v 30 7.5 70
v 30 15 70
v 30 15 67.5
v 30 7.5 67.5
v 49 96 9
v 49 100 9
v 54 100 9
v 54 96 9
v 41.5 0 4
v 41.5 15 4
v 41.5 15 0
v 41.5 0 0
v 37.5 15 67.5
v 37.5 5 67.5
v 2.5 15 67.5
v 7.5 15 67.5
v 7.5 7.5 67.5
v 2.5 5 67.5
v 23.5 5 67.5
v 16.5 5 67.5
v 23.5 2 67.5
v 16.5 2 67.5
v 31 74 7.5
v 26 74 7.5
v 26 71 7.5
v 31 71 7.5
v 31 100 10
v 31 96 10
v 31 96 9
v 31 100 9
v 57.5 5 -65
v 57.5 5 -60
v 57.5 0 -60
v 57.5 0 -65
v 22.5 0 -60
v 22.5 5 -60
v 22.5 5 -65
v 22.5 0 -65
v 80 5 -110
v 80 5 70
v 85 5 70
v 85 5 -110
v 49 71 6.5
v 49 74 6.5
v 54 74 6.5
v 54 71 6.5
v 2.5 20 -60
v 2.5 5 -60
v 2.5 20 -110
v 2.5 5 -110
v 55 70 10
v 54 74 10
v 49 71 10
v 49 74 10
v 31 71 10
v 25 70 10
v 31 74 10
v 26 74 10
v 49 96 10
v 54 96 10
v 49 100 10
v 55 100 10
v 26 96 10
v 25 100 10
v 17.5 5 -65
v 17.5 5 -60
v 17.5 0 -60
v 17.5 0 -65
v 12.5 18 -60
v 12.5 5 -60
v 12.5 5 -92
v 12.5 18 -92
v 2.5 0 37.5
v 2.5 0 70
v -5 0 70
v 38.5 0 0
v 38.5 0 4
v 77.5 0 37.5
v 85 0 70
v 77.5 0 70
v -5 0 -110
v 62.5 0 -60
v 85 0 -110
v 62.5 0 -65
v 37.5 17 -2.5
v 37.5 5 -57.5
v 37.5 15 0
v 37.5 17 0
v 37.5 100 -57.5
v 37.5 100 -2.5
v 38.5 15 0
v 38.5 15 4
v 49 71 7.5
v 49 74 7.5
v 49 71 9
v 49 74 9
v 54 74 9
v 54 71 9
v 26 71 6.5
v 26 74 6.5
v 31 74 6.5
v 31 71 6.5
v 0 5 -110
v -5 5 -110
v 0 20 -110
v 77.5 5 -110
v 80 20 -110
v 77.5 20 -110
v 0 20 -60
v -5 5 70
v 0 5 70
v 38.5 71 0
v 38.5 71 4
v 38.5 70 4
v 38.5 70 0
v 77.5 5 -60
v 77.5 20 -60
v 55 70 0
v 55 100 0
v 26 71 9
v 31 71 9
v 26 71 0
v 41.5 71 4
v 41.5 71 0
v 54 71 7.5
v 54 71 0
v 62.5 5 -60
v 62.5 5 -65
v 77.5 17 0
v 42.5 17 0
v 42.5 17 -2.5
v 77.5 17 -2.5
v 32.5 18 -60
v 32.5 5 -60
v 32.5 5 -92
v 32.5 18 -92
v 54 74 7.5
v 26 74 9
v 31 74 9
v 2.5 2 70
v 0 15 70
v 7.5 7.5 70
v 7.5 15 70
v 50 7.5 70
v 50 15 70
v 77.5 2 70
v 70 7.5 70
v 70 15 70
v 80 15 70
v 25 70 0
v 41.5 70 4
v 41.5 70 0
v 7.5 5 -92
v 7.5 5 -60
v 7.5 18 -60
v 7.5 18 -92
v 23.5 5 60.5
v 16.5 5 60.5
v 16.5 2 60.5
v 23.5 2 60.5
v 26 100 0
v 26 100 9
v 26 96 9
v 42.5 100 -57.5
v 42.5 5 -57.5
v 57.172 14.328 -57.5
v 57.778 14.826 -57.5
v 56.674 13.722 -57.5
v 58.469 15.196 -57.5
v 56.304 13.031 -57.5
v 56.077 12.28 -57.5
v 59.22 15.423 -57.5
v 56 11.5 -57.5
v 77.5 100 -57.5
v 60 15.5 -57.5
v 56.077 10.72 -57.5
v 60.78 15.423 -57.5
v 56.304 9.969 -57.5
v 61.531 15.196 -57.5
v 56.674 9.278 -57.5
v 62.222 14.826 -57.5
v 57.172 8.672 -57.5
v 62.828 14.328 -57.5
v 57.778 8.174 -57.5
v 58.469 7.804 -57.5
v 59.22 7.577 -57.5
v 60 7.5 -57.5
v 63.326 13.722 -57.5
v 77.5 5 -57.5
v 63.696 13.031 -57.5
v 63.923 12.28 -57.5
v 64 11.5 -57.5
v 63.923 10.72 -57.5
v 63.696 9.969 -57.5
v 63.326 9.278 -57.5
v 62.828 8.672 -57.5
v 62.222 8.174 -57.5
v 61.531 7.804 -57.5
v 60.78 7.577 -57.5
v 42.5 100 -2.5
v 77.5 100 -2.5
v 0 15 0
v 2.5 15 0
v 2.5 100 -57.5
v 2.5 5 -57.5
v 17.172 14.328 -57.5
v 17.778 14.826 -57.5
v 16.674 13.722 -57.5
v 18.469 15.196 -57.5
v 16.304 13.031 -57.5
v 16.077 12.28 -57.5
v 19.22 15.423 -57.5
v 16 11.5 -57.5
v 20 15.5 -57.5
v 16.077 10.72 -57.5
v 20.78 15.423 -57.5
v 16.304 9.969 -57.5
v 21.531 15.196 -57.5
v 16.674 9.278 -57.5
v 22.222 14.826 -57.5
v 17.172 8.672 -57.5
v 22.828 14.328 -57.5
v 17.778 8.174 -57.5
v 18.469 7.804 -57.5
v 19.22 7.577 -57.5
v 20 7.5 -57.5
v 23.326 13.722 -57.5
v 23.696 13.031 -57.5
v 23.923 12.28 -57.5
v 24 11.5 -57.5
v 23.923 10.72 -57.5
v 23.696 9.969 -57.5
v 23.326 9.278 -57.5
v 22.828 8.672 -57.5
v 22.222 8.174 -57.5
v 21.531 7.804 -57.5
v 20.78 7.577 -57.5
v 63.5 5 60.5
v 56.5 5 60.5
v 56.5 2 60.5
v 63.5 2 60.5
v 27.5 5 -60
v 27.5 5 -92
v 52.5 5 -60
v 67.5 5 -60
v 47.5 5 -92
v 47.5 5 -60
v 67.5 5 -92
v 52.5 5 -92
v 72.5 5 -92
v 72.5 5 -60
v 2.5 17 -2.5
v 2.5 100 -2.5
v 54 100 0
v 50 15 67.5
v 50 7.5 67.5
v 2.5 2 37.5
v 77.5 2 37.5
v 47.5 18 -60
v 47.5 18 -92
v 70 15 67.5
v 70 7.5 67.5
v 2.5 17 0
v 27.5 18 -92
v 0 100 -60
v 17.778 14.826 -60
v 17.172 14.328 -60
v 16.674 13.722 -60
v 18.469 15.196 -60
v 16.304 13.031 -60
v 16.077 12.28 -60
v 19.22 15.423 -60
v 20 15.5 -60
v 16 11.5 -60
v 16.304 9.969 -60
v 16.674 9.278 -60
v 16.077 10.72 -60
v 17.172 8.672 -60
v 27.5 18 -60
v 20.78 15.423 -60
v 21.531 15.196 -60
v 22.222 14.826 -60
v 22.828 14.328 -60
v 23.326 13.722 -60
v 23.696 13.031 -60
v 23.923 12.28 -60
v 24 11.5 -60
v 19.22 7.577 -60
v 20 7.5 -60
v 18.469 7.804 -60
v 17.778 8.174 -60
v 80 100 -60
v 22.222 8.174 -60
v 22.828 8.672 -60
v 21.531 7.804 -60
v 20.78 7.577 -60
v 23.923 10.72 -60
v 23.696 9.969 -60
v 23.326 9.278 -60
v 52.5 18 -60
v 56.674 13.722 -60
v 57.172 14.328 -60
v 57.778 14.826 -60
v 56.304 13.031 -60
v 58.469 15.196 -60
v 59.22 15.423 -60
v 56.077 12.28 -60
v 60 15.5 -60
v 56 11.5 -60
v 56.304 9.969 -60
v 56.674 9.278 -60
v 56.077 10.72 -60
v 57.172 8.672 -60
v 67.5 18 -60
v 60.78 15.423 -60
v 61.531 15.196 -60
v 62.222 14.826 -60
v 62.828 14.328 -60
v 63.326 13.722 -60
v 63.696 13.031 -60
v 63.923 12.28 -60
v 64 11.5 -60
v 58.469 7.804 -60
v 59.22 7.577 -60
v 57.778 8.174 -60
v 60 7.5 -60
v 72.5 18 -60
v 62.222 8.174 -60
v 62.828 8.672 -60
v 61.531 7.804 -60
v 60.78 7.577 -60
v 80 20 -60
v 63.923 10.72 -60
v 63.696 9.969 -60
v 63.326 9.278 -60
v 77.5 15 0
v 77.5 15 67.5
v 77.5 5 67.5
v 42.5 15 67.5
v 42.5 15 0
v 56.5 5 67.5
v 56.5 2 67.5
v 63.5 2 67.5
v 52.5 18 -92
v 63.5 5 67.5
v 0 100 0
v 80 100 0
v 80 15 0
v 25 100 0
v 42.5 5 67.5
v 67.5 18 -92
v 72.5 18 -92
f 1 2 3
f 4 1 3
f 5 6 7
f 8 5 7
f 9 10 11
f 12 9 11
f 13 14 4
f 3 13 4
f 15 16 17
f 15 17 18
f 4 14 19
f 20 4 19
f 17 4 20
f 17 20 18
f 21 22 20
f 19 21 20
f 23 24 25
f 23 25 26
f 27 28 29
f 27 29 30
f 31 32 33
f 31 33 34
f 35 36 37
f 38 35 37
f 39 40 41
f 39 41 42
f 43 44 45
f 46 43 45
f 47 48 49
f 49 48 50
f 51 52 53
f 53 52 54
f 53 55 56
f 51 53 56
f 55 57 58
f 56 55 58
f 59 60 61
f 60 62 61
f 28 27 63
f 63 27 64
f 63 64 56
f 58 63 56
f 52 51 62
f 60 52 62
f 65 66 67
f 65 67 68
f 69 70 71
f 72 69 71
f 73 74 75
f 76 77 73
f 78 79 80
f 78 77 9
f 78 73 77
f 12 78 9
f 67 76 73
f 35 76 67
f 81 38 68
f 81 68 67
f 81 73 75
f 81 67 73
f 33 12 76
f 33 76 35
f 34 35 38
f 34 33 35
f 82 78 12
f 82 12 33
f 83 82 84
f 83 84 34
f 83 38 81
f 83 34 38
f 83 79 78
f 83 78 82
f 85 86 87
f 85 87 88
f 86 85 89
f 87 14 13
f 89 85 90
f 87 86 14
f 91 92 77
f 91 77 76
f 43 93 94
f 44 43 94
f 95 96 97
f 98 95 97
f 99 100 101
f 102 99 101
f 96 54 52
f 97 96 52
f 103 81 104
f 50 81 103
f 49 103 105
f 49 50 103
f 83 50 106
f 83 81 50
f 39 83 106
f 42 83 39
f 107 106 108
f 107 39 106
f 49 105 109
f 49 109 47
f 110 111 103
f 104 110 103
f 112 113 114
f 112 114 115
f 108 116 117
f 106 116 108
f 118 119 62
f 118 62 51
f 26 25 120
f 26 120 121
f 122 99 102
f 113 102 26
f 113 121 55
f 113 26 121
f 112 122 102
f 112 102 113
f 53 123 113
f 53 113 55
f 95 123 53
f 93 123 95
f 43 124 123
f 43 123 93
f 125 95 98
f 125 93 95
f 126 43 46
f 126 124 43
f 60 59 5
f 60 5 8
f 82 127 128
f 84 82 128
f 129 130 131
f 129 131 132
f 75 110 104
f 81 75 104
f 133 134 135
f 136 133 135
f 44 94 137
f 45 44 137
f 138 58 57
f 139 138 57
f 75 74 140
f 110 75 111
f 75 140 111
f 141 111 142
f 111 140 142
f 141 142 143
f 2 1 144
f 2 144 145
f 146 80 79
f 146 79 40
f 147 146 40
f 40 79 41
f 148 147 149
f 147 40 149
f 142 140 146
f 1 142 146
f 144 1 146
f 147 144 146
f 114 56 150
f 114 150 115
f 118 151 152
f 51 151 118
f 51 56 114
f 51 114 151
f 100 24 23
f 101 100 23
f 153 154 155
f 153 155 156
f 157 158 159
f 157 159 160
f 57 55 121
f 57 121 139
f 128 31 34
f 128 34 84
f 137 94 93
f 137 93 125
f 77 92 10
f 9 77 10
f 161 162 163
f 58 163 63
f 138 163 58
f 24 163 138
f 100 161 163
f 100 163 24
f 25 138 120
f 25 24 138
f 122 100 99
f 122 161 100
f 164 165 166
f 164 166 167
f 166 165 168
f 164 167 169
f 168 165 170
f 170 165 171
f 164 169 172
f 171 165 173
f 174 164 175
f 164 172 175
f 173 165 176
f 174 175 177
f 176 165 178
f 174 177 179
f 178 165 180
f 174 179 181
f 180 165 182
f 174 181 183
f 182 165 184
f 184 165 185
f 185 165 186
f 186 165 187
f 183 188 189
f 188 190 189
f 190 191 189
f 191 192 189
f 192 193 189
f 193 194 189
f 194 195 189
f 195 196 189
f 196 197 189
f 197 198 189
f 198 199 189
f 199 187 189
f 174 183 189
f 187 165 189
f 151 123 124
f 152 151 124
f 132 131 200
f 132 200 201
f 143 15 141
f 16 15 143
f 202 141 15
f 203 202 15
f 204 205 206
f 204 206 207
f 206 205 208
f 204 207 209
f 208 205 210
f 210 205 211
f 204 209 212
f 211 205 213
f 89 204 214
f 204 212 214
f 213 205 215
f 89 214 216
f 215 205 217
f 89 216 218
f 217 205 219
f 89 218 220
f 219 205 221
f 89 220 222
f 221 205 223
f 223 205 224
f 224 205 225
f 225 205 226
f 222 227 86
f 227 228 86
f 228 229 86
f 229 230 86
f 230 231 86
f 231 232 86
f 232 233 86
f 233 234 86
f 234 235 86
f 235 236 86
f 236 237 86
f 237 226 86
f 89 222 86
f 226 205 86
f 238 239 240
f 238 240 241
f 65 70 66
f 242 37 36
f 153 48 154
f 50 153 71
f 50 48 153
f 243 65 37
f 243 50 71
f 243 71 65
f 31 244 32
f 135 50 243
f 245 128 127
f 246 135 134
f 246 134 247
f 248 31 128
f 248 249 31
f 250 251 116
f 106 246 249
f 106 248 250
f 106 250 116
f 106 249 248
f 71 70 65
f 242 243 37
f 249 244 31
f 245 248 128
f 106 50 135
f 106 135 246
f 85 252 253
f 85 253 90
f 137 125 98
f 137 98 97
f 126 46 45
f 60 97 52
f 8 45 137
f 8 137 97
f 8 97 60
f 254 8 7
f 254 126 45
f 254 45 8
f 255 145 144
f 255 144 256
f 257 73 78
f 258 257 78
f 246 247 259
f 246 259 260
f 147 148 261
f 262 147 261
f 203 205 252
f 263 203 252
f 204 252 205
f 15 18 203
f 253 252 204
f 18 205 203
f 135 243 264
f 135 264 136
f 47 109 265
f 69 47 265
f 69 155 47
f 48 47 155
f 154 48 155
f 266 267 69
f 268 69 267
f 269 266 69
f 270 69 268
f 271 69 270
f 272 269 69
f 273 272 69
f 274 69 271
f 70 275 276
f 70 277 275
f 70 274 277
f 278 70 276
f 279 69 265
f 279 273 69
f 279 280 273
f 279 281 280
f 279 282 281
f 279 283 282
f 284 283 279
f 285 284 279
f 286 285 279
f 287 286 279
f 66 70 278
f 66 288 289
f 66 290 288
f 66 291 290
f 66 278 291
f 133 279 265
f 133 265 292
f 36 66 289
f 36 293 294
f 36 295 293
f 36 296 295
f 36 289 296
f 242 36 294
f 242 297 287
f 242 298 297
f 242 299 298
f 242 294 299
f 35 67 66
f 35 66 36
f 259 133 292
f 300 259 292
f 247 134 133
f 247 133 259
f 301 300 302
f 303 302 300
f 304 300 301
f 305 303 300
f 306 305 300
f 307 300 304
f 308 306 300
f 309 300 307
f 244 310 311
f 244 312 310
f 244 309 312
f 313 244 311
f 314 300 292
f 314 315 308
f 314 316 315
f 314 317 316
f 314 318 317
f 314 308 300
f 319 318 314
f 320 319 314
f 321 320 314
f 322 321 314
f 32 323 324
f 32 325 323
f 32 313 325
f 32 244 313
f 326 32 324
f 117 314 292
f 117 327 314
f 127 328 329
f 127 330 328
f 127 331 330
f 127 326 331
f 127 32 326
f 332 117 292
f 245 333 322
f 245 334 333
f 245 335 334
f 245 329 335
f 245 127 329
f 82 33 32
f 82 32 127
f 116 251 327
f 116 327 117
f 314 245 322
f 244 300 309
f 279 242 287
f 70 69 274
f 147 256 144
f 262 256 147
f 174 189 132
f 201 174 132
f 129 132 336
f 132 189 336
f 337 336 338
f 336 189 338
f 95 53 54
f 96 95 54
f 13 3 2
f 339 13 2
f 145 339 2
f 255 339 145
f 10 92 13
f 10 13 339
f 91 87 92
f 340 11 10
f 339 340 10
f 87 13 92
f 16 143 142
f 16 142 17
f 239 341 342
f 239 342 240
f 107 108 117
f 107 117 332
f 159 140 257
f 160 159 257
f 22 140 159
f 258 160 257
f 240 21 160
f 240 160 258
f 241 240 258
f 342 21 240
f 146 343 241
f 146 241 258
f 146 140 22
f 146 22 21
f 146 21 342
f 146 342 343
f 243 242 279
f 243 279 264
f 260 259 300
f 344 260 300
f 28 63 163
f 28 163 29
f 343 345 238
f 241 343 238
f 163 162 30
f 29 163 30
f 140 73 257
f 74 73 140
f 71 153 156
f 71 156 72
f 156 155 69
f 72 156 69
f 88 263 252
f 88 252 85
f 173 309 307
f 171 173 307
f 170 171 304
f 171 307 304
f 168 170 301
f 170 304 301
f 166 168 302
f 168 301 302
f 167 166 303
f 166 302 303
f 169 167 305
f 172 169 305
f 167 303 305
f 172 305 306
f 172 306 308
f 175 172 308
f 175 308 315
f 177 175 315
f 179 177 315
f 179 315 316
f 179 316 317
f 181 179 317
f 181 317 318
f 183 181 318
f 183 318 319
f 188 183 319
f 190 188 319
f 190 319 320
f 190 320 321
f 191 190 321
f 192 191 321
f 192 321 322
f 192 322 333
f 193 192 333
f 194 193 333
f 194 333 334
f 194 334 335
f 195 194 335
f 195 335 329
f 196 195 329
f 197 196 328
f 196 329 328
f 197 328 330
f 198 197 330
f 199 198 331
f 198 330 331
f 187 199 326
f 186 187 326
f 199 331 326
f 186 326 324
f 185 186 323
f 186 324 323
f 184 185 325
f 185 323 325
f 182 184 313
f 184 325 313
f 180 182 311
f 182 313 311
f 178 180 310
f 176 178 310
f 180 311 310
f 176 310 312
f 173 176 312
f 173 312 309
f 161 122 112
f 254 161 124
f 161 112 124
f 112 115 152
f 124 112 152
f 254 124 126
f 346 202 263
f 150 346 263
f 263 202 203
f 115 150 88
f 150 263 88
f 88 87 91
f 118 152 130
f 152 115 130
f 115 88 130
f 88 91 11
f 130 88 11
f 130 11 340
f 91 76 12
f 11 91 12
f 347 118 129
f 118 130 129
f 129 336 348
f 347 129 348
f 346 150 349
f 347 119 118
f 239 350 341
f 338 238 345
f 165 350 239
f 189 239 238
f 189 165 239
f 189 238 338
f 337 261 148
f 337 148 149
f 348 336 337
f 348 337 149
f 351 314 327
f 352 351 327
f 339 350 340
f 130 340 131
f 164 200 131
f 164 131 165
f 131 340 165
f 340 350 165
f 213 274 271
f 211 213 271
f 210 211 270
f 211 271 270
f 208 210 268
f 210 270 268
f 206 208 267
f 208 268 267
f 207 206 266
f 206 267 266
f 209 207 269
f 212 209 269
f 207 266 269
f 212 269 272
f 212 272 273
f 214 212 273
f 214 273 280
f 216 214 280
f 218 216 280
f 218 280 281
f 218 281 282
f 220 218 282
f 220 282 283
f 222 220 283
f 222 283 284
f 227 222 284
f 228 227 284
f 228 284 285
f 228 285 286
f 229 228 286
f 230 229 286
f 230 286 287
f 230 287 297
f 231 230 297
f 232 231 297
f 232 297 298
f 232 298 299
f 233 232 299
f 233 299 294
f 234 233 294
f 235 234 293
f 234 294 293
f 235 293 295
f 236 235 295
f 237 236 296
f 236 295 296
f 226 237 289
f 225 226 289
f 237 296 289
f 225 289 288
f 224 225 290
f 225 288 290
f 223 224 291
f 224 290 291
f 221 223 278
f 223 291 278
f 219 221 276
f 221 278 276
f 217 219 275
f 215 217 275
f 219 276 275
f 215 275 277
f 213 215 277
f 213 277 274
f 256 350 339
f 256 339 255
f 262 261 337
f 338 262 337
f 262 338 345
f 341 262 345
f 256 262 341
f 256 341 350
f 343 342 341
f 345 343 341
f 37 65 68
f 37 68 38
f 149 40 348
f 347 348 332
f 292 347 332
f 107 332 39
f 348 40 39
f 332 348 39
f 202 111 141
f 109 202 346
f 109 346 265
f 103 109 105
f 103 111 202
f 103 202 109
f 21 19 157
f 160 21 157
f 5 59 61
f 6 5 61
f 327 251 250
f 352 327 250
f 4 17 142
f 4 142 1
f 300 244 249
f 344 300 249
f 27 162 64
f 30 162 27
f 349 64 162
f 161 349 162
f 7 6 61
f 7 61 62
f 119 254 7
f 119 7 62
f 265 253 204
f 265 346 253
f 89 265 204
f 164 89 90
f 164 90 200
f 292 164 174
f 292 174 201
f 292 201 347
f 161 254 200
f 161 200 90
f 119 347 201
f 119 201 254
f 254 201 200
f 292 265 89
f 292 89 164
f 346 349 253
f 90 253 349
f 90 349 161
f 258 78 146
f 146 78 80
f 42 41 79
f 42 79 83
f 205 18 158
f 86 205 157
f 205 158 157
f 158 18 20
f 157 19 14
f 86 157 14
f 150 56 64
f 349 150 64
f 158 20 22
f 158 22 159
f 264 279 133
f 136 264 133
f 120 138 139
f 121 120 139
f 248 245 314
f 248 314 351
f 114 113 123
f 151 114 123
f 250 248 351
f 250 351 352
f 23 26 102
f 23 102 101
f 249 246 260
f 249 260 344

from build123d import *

# Parameters (mm, degrees)
SKETCH1_W                                   = 80
SKETCH1_H                                   = 60
BOSS_EXTRUDE1_DEPTH                         = 100
CUT_EXTRUDE1_START                          = 5
SKETCH2_W                                   = 35
SKETCH2_H                                   = 55
CUT_EXTRUDE1_DEPTH                          = 95
SKETCH3_W                                   = 80
SKETCH3_H                                   = 5
BOSS_EXTRUDE2_DEPTH                         = 70
BOSS_EXTRUDE3_DEPTH                         = 10
SKETCH5_W                                   = 22.5
SKETCH5_H                                   = 2.5
SKETCH5_W_2                                 = 20
CUT_EXTRUDE2_DEPTH                          = 7.5
SKETCH6_W                                   = 35
SKETCH6_H                                   = 12
CUT_EXTRUDE4_DEPTH                          = 57.5
CUT_EXTRUDE6_REACH                          = 184.483
SKETCH7_R                                   = 4
SKETCH9_W                                   = 80
SKETCH9_H                                   = 50
BOSS_EXTRUDE4_DEPTH                         = 5
SKETCH11_W                                  = 75
SKETCH11_H                                  = 32.5
CUT_EXTRUDE7_DEPTH                          = 2
SKETCH13_W                                  = 7
SKETCH13_H                                  = 7
CUT_EXTRUDE8_DEPTH                          = 166.90660023
BOSS_EXTRUDE5_DEPTH                         = 10
SKETCH15_W                                  = 6
SKETCH15_H                                  = 4
BOSS_EXTRUDE6_DEPTH                         = 1
BOSS_EXTRUDE7_START                         = -2.5
SKETCH15_2_W                                = 6
SKETCH15_2_H                                = 4
BOSS_EXTRUDE7_DEPTH                         = 1
SKETCH17_W                                  = 6
SKETCH17_H                                  = 4
BOSS_EXTRUDE8_DEPTH                         = 1
SKETCH18_W                                  = 3
SKETCH18_H                                  = 4
CUT_EXTRUDE9_OLED_CABLE_DEPTH               = 154.430766146
SKETCH20_W                                  = 5
SKETCH20_H                                  = 5
CUT_EXTRUDE10_SOLENOID_WIRE_DEPTH           = 166.90660023
SKETCH21_W                                  = 5
SKETCH21_H                                  = 32
BOSS_EXTRUDE9_SOLENOID_SIDE_SUPPORT_DEPTH   = 13
SKETCH27_W                                  = 2.5
SKETCH27_H                                  = 50
BOSS_EXTRUDE13_SOLENOID_SECTION_WALLS_DEPTH = 15
SKETCH29_W                                  = 180
SKETCH29_H                                  = 5
BOSS_EXTRUDE9_GUIDE_DEPTH                   = 5
BOSS_EXTRUDE10_START                        = -80
SKETCH29_3_W                                = 180
SKETCH29_3_H                                = 5
BOSS_EXTRUDE10_GUIDE_DEPTH                  = 5


with BuildPart() as part:
    # Sketch1 → Boss-Extrude1 (new body)
    with BuildSketch(Plane(origin=(0, 0, 0), x_dir=(1, 0, 0), z_dir=(0, 1, 0))):
        with Locations((40, 30)):
            Rectangle(SKETCH1_W, SKETCH1_H)
    extrude(amount=BOSS_EXTRUDE1_DEPTH)

    # Sketch2 → Cut-Extrude1 (cut)
    with BuildSketch(Plane(origin=(0, 0, 0), x_dir=(1, 0, 0), z_dir=(0, 1, 0)).offset(CUT_EXTRUDE1_START)):
        with Locations((20, 30)):
            Rectangle(SKETCH2_W, SKETCH2_H)
        with Locations((60, 30)):
            Rectangle(SKETCH2_W, SKETCH2_H)
    extrude(amount=CUT_EXTRUDE1_DEPTH, mode=Mode.SUBTRACT)

    # Sketch3 → Boss-Extrude2 (add)
    with BuildSketch(Plane.XY):
        with Locations((40, 2.5)):
            Rectangle(SKETCH3_W, SKETCH3_H)
    extrude(amount=BOSS_EXTRUDE2_DEPTH)

    # Sketch4 → Boss-Extrude3 (add)
    with BuildSketch(Plane(origin=(0, 5, 0), x_dir=(1, 0, 0), z_dir=(0, 1, 0))):
        Polygon((80, 0), (77.5, 0), (77.5, -67.5), (42.5, -67.5), (42.5, 0), (37.5, 0), (37.5, -67.5), (2.5, -67.5), (2.5, 0), (0, 0), (0, -70), (80, -70), align=None)
    extrude(amount=BOSS_EXTRUDE3_DEPTH)

    # Sketch5 → Cut-Extrude2 (cut)
    with BuildSketch(Plane(origin=(0, 15, 0), x_dir=(1, 0, 0), z_dir=(0, 1, 0))):
        with Locations((18.75, -68.75)):
            Rectangle(SKETCH5_W, SKETCH5_H)
        with Locations((60, -68.75)):
            Rectangle(SKETCH5_W_2, SKETCH5_H)
    extrude(amount=-CUT_EXTRUDE2_DEPTH, mode=Mode.SUBTRACT)

    # Sketch6 → Cut-Extrude4 (cut)
    with BuildSketch(Plane.XY):
        with Locations((20, 11)):
            Rectangle(SKETCH6_W, SKETCH6_H)
        with Locations((60, 11)):
            Rectangle(SKETCH6_W, SKETCH6_H)
    extrude(amount=-CUT_EXTRUDE4_DEPTH, mode=Mode.SUBTRACT)

    # Sketch7 → Cut-Extrude6 (cut, up to next)
    with BuildSketch(Plane(origin=(0, 0, -60), x_dir=(-1, 0, 0), z_dir=(0, 0, -1)), mode=Mode.PRIVATE) as cut_extrude6_sk1:
        with Locations((-20, 11.5)):
            Circle(SKETCH7_R)
    cut_extrude6_tool1 = extrude(cut_extrude6_sk1.sketch, amount=-CUT_EXTRUDE6_REACH, mode=Mode.PRIVATE) & part.part
    # Sketch7 → Cut-Extrude6 (cut, up to next)
    with BuildSketch(Plane(origin=(0, 0, -60), x_dir=(-1, 0, 0), z_dir=(0, 0, -1)), mode=Mode.PRIVATE) as cut_extrude6_sk2:
        with Locations((-60, 11.5)):
            Circle(SKETCH7_R)
    cut_extrude6_tool2 = extrude(cut_extrude6_sk2.sketch, amount=-CUT_EXTRUDE6_REACH, mode=Mode.PRIVATE) & part.part
    add(cut_extrude6_tool1.solids().sort_by_distance((20, 11.5, -60))[0], mode=Mode.SUBTRACT)
    add(cut_extrude6_tool2.solids().sort_by_distance((60, 11.5, -60))[0], mode=Mode.SUBTRACT)

    # Sketch9 → Boss-Extrude4 (add)
    with BuildSketch(Plane(origin=(0, 0, 0), x_dir=(1, 0, 0), z_dir=(0, 1, 0))):
        with Locations((40, 85)):
            Rectangle(SKETCH9_W, SKETCH9_H)
    extrude(amount=BOSS_EXTRUDE4_DEPTH)

    # Sketch11 → Cut-Extrude7 (cut)
    with BuildSketch(Plane.XZ):
        with Locations((40, 53.75)):
            Rectangle(SKETCH11_W, SKETCH11_H)
    extrude(amount=-CUT_EXTRUDE7_DEPTH, mode=Mode.SUBTRACT)

    # Sketch13 → Cut-Extrude8 (cut, through all)
    with BuildSketch(Plane(origin=(0, 5, 0), x_dir=(1, 0, 0), z_dir=(0, 1, 0))):
        with Locations((20, -64)):
            Rectangle(SKETCH13_W, SKETCH13_H)
        with Locations((60, -64)):
            Rectangle(SKETCH13_W, SKETCH13_H)
    extrude(amount=-CUT_EXTRUDE8_DEPTH, mode=Mode.SUBTRACT)

    # Sketch14 → Boss-Extrude5 (add)
    with BuildSketch(Plane.XY):
        Polygon((25, 100), (26, 100), (26, 71), (54, 71), (54, 100), (55, 100), (55, 70), (54, 70), (26, 70), (25, 70), align=None)
    extrude(amount=BOSS_EXTRUDE5_DEPTH)

    # Sketch15 → Boss-Extrude6 (add)
    with BuildSketch(Plane.XY.offset(10)):
        with Locations((28, 72)):
            Rectangle(SKETCH15_W, SKETCH15_H)
        with Locations((52, 72)):
            Rectangle(SKETCH15_W, SKETCH15_H)
    extrude(amount=-BOSS_EXTRUDE6_DEPTH)

    # Sketch15<2> → Boss-Extrude7 (add)
    with BuildSketch(Plane.XY.offset(10).offset(BOSS_EXTRUDE7_START)):
        with Locations((28, 72)):
            Rectangle(SKETCH15_2_W, SKETCH15_2_H)
        with Locations((52, 72)):
            Rectangle(SKETCH15_2_W, SKETCH15_2_H)
    extrude(amount=-BOSS_EXTRUDE7_DEPTH)

    # Sketch17 → Boss-Extrude8 (add)
    with BuildSketch(Plane.XY.offset(10)):
        with Locations((28, 98)):
            Rectangle(SKETCH17_W, SKETCH17_H)
        with Locations((52, 98)):
            Rectangle(SKETCH17_W, SKETCH17_H)
    extrude(amount=-BOSS_EXTRUDE8_DEPTH)

    # Sketch18 → Cut-Extrude9 (OLED Cable) (cut, through all)
    with BuildSketch(Plane(origin=(0, 71, 0), x_dir=(1, 0, 0), z_dir=(0, 1, 0))):
        with Locations((40, -2)):
            Rectangle(SKETCH18_W, SKETCH18_H)
    extrude(amount=-CUT_EXTRUDE9_OLED_CABLE_DEPTH, mode=Mode.SUBTRACT)

    # Sketch20 → Cut-Extrude10 (Solenoid Wire) (cut, through all)
    with BuildSketch(Plane(origin=(0, 5, 0), x_dir=(1, 0, 0), z_dir=(0, 1, 0))):
        with Locations((60, 62.5)):
            Rectangle(SKETCH20_W, SKETCH20_H)
        with Locations((20, 62.5)):
            Rectangle(SKETCH20_W, SKETCH20_H)
    extrude(amount=-CUT_EXTRUDE10_SOLENOID_WIRE_DEPTH, mode=Mode.SUBTRACT)

    # Sketch21 → Boss-Extrude9 (Solenoid Side Support) (add)
    with BuildSketch(Plane(origin=(0, 5, 0), x_dir=(1, 0, 0), z_dir=(0, 1, 0))):
        with Locations((70, 76)):
            Rectangle(SKETCH21_W, SKETCH21_H)
        with Locations((50, 76)):
            Rectangle(SKETCH21_W, SKETCH21_H)
        with Locations((30, 76)):
            Rectangle(SKETCH21_W, SKETCH21_H)
        with Locations((10, 76)):
            Rectangle(SKETCH21_W, SKETCH21_H)
    extrude(amount=BOSS_EXTRUDE9_SOLENOID_SIDE_SUPPORT_DEPTH)

    # Sketch27 → Boss-Extrude13 (Solenoid Section Walls) (add)
    with BuildSketch(Plane(origin=(0, 5, 0), x_dir=(1, 0, 0), z_dir=(0, 1, 0))):
        with Locations((78.75, 85)):
            Rectangle(SKETCH27_W, SKETCH27_H)
        with Locations((1.25, 85)):
            Rectangle(SKETCH27_W, SKETCH27_H)
    extrude(amount=BOSS_EXTRUDE13_SOLENOID_SECTION_WALLS_DEPTH)

    # Sketch29 → Boss-Extrude9 (Guide) (add)
    with BuildSketch(Plane(origin=(80, 0, 0), x_dir=(0, 0, -1), z_dir=(1, 0, 0))):
        with Locations((20, 2.5)):
            Rectangle(SKETCH29_W, SKETCH29_H)
    extrude(amount=BOSS_EXTRUDE9_GUIDE_DEPTH)

    # Sketch29<3> → Boss-Extrude10 (Guide) (add)
    with BuildSketch(Plane(origin=(80, 0, 0), x_dir=(0, 0, -1), z_dir=(1, 0, 0)).offset(BOSS_EXTRUDE10_START)):
        with Locations((20, 2.5)):
            Rectangle(SKETCH29_3_W, SKETCH29_3_H)
    extrude(amount=-BOSS_EXTRUDE10_GUIDE_DEPTH)


solid = part.part
